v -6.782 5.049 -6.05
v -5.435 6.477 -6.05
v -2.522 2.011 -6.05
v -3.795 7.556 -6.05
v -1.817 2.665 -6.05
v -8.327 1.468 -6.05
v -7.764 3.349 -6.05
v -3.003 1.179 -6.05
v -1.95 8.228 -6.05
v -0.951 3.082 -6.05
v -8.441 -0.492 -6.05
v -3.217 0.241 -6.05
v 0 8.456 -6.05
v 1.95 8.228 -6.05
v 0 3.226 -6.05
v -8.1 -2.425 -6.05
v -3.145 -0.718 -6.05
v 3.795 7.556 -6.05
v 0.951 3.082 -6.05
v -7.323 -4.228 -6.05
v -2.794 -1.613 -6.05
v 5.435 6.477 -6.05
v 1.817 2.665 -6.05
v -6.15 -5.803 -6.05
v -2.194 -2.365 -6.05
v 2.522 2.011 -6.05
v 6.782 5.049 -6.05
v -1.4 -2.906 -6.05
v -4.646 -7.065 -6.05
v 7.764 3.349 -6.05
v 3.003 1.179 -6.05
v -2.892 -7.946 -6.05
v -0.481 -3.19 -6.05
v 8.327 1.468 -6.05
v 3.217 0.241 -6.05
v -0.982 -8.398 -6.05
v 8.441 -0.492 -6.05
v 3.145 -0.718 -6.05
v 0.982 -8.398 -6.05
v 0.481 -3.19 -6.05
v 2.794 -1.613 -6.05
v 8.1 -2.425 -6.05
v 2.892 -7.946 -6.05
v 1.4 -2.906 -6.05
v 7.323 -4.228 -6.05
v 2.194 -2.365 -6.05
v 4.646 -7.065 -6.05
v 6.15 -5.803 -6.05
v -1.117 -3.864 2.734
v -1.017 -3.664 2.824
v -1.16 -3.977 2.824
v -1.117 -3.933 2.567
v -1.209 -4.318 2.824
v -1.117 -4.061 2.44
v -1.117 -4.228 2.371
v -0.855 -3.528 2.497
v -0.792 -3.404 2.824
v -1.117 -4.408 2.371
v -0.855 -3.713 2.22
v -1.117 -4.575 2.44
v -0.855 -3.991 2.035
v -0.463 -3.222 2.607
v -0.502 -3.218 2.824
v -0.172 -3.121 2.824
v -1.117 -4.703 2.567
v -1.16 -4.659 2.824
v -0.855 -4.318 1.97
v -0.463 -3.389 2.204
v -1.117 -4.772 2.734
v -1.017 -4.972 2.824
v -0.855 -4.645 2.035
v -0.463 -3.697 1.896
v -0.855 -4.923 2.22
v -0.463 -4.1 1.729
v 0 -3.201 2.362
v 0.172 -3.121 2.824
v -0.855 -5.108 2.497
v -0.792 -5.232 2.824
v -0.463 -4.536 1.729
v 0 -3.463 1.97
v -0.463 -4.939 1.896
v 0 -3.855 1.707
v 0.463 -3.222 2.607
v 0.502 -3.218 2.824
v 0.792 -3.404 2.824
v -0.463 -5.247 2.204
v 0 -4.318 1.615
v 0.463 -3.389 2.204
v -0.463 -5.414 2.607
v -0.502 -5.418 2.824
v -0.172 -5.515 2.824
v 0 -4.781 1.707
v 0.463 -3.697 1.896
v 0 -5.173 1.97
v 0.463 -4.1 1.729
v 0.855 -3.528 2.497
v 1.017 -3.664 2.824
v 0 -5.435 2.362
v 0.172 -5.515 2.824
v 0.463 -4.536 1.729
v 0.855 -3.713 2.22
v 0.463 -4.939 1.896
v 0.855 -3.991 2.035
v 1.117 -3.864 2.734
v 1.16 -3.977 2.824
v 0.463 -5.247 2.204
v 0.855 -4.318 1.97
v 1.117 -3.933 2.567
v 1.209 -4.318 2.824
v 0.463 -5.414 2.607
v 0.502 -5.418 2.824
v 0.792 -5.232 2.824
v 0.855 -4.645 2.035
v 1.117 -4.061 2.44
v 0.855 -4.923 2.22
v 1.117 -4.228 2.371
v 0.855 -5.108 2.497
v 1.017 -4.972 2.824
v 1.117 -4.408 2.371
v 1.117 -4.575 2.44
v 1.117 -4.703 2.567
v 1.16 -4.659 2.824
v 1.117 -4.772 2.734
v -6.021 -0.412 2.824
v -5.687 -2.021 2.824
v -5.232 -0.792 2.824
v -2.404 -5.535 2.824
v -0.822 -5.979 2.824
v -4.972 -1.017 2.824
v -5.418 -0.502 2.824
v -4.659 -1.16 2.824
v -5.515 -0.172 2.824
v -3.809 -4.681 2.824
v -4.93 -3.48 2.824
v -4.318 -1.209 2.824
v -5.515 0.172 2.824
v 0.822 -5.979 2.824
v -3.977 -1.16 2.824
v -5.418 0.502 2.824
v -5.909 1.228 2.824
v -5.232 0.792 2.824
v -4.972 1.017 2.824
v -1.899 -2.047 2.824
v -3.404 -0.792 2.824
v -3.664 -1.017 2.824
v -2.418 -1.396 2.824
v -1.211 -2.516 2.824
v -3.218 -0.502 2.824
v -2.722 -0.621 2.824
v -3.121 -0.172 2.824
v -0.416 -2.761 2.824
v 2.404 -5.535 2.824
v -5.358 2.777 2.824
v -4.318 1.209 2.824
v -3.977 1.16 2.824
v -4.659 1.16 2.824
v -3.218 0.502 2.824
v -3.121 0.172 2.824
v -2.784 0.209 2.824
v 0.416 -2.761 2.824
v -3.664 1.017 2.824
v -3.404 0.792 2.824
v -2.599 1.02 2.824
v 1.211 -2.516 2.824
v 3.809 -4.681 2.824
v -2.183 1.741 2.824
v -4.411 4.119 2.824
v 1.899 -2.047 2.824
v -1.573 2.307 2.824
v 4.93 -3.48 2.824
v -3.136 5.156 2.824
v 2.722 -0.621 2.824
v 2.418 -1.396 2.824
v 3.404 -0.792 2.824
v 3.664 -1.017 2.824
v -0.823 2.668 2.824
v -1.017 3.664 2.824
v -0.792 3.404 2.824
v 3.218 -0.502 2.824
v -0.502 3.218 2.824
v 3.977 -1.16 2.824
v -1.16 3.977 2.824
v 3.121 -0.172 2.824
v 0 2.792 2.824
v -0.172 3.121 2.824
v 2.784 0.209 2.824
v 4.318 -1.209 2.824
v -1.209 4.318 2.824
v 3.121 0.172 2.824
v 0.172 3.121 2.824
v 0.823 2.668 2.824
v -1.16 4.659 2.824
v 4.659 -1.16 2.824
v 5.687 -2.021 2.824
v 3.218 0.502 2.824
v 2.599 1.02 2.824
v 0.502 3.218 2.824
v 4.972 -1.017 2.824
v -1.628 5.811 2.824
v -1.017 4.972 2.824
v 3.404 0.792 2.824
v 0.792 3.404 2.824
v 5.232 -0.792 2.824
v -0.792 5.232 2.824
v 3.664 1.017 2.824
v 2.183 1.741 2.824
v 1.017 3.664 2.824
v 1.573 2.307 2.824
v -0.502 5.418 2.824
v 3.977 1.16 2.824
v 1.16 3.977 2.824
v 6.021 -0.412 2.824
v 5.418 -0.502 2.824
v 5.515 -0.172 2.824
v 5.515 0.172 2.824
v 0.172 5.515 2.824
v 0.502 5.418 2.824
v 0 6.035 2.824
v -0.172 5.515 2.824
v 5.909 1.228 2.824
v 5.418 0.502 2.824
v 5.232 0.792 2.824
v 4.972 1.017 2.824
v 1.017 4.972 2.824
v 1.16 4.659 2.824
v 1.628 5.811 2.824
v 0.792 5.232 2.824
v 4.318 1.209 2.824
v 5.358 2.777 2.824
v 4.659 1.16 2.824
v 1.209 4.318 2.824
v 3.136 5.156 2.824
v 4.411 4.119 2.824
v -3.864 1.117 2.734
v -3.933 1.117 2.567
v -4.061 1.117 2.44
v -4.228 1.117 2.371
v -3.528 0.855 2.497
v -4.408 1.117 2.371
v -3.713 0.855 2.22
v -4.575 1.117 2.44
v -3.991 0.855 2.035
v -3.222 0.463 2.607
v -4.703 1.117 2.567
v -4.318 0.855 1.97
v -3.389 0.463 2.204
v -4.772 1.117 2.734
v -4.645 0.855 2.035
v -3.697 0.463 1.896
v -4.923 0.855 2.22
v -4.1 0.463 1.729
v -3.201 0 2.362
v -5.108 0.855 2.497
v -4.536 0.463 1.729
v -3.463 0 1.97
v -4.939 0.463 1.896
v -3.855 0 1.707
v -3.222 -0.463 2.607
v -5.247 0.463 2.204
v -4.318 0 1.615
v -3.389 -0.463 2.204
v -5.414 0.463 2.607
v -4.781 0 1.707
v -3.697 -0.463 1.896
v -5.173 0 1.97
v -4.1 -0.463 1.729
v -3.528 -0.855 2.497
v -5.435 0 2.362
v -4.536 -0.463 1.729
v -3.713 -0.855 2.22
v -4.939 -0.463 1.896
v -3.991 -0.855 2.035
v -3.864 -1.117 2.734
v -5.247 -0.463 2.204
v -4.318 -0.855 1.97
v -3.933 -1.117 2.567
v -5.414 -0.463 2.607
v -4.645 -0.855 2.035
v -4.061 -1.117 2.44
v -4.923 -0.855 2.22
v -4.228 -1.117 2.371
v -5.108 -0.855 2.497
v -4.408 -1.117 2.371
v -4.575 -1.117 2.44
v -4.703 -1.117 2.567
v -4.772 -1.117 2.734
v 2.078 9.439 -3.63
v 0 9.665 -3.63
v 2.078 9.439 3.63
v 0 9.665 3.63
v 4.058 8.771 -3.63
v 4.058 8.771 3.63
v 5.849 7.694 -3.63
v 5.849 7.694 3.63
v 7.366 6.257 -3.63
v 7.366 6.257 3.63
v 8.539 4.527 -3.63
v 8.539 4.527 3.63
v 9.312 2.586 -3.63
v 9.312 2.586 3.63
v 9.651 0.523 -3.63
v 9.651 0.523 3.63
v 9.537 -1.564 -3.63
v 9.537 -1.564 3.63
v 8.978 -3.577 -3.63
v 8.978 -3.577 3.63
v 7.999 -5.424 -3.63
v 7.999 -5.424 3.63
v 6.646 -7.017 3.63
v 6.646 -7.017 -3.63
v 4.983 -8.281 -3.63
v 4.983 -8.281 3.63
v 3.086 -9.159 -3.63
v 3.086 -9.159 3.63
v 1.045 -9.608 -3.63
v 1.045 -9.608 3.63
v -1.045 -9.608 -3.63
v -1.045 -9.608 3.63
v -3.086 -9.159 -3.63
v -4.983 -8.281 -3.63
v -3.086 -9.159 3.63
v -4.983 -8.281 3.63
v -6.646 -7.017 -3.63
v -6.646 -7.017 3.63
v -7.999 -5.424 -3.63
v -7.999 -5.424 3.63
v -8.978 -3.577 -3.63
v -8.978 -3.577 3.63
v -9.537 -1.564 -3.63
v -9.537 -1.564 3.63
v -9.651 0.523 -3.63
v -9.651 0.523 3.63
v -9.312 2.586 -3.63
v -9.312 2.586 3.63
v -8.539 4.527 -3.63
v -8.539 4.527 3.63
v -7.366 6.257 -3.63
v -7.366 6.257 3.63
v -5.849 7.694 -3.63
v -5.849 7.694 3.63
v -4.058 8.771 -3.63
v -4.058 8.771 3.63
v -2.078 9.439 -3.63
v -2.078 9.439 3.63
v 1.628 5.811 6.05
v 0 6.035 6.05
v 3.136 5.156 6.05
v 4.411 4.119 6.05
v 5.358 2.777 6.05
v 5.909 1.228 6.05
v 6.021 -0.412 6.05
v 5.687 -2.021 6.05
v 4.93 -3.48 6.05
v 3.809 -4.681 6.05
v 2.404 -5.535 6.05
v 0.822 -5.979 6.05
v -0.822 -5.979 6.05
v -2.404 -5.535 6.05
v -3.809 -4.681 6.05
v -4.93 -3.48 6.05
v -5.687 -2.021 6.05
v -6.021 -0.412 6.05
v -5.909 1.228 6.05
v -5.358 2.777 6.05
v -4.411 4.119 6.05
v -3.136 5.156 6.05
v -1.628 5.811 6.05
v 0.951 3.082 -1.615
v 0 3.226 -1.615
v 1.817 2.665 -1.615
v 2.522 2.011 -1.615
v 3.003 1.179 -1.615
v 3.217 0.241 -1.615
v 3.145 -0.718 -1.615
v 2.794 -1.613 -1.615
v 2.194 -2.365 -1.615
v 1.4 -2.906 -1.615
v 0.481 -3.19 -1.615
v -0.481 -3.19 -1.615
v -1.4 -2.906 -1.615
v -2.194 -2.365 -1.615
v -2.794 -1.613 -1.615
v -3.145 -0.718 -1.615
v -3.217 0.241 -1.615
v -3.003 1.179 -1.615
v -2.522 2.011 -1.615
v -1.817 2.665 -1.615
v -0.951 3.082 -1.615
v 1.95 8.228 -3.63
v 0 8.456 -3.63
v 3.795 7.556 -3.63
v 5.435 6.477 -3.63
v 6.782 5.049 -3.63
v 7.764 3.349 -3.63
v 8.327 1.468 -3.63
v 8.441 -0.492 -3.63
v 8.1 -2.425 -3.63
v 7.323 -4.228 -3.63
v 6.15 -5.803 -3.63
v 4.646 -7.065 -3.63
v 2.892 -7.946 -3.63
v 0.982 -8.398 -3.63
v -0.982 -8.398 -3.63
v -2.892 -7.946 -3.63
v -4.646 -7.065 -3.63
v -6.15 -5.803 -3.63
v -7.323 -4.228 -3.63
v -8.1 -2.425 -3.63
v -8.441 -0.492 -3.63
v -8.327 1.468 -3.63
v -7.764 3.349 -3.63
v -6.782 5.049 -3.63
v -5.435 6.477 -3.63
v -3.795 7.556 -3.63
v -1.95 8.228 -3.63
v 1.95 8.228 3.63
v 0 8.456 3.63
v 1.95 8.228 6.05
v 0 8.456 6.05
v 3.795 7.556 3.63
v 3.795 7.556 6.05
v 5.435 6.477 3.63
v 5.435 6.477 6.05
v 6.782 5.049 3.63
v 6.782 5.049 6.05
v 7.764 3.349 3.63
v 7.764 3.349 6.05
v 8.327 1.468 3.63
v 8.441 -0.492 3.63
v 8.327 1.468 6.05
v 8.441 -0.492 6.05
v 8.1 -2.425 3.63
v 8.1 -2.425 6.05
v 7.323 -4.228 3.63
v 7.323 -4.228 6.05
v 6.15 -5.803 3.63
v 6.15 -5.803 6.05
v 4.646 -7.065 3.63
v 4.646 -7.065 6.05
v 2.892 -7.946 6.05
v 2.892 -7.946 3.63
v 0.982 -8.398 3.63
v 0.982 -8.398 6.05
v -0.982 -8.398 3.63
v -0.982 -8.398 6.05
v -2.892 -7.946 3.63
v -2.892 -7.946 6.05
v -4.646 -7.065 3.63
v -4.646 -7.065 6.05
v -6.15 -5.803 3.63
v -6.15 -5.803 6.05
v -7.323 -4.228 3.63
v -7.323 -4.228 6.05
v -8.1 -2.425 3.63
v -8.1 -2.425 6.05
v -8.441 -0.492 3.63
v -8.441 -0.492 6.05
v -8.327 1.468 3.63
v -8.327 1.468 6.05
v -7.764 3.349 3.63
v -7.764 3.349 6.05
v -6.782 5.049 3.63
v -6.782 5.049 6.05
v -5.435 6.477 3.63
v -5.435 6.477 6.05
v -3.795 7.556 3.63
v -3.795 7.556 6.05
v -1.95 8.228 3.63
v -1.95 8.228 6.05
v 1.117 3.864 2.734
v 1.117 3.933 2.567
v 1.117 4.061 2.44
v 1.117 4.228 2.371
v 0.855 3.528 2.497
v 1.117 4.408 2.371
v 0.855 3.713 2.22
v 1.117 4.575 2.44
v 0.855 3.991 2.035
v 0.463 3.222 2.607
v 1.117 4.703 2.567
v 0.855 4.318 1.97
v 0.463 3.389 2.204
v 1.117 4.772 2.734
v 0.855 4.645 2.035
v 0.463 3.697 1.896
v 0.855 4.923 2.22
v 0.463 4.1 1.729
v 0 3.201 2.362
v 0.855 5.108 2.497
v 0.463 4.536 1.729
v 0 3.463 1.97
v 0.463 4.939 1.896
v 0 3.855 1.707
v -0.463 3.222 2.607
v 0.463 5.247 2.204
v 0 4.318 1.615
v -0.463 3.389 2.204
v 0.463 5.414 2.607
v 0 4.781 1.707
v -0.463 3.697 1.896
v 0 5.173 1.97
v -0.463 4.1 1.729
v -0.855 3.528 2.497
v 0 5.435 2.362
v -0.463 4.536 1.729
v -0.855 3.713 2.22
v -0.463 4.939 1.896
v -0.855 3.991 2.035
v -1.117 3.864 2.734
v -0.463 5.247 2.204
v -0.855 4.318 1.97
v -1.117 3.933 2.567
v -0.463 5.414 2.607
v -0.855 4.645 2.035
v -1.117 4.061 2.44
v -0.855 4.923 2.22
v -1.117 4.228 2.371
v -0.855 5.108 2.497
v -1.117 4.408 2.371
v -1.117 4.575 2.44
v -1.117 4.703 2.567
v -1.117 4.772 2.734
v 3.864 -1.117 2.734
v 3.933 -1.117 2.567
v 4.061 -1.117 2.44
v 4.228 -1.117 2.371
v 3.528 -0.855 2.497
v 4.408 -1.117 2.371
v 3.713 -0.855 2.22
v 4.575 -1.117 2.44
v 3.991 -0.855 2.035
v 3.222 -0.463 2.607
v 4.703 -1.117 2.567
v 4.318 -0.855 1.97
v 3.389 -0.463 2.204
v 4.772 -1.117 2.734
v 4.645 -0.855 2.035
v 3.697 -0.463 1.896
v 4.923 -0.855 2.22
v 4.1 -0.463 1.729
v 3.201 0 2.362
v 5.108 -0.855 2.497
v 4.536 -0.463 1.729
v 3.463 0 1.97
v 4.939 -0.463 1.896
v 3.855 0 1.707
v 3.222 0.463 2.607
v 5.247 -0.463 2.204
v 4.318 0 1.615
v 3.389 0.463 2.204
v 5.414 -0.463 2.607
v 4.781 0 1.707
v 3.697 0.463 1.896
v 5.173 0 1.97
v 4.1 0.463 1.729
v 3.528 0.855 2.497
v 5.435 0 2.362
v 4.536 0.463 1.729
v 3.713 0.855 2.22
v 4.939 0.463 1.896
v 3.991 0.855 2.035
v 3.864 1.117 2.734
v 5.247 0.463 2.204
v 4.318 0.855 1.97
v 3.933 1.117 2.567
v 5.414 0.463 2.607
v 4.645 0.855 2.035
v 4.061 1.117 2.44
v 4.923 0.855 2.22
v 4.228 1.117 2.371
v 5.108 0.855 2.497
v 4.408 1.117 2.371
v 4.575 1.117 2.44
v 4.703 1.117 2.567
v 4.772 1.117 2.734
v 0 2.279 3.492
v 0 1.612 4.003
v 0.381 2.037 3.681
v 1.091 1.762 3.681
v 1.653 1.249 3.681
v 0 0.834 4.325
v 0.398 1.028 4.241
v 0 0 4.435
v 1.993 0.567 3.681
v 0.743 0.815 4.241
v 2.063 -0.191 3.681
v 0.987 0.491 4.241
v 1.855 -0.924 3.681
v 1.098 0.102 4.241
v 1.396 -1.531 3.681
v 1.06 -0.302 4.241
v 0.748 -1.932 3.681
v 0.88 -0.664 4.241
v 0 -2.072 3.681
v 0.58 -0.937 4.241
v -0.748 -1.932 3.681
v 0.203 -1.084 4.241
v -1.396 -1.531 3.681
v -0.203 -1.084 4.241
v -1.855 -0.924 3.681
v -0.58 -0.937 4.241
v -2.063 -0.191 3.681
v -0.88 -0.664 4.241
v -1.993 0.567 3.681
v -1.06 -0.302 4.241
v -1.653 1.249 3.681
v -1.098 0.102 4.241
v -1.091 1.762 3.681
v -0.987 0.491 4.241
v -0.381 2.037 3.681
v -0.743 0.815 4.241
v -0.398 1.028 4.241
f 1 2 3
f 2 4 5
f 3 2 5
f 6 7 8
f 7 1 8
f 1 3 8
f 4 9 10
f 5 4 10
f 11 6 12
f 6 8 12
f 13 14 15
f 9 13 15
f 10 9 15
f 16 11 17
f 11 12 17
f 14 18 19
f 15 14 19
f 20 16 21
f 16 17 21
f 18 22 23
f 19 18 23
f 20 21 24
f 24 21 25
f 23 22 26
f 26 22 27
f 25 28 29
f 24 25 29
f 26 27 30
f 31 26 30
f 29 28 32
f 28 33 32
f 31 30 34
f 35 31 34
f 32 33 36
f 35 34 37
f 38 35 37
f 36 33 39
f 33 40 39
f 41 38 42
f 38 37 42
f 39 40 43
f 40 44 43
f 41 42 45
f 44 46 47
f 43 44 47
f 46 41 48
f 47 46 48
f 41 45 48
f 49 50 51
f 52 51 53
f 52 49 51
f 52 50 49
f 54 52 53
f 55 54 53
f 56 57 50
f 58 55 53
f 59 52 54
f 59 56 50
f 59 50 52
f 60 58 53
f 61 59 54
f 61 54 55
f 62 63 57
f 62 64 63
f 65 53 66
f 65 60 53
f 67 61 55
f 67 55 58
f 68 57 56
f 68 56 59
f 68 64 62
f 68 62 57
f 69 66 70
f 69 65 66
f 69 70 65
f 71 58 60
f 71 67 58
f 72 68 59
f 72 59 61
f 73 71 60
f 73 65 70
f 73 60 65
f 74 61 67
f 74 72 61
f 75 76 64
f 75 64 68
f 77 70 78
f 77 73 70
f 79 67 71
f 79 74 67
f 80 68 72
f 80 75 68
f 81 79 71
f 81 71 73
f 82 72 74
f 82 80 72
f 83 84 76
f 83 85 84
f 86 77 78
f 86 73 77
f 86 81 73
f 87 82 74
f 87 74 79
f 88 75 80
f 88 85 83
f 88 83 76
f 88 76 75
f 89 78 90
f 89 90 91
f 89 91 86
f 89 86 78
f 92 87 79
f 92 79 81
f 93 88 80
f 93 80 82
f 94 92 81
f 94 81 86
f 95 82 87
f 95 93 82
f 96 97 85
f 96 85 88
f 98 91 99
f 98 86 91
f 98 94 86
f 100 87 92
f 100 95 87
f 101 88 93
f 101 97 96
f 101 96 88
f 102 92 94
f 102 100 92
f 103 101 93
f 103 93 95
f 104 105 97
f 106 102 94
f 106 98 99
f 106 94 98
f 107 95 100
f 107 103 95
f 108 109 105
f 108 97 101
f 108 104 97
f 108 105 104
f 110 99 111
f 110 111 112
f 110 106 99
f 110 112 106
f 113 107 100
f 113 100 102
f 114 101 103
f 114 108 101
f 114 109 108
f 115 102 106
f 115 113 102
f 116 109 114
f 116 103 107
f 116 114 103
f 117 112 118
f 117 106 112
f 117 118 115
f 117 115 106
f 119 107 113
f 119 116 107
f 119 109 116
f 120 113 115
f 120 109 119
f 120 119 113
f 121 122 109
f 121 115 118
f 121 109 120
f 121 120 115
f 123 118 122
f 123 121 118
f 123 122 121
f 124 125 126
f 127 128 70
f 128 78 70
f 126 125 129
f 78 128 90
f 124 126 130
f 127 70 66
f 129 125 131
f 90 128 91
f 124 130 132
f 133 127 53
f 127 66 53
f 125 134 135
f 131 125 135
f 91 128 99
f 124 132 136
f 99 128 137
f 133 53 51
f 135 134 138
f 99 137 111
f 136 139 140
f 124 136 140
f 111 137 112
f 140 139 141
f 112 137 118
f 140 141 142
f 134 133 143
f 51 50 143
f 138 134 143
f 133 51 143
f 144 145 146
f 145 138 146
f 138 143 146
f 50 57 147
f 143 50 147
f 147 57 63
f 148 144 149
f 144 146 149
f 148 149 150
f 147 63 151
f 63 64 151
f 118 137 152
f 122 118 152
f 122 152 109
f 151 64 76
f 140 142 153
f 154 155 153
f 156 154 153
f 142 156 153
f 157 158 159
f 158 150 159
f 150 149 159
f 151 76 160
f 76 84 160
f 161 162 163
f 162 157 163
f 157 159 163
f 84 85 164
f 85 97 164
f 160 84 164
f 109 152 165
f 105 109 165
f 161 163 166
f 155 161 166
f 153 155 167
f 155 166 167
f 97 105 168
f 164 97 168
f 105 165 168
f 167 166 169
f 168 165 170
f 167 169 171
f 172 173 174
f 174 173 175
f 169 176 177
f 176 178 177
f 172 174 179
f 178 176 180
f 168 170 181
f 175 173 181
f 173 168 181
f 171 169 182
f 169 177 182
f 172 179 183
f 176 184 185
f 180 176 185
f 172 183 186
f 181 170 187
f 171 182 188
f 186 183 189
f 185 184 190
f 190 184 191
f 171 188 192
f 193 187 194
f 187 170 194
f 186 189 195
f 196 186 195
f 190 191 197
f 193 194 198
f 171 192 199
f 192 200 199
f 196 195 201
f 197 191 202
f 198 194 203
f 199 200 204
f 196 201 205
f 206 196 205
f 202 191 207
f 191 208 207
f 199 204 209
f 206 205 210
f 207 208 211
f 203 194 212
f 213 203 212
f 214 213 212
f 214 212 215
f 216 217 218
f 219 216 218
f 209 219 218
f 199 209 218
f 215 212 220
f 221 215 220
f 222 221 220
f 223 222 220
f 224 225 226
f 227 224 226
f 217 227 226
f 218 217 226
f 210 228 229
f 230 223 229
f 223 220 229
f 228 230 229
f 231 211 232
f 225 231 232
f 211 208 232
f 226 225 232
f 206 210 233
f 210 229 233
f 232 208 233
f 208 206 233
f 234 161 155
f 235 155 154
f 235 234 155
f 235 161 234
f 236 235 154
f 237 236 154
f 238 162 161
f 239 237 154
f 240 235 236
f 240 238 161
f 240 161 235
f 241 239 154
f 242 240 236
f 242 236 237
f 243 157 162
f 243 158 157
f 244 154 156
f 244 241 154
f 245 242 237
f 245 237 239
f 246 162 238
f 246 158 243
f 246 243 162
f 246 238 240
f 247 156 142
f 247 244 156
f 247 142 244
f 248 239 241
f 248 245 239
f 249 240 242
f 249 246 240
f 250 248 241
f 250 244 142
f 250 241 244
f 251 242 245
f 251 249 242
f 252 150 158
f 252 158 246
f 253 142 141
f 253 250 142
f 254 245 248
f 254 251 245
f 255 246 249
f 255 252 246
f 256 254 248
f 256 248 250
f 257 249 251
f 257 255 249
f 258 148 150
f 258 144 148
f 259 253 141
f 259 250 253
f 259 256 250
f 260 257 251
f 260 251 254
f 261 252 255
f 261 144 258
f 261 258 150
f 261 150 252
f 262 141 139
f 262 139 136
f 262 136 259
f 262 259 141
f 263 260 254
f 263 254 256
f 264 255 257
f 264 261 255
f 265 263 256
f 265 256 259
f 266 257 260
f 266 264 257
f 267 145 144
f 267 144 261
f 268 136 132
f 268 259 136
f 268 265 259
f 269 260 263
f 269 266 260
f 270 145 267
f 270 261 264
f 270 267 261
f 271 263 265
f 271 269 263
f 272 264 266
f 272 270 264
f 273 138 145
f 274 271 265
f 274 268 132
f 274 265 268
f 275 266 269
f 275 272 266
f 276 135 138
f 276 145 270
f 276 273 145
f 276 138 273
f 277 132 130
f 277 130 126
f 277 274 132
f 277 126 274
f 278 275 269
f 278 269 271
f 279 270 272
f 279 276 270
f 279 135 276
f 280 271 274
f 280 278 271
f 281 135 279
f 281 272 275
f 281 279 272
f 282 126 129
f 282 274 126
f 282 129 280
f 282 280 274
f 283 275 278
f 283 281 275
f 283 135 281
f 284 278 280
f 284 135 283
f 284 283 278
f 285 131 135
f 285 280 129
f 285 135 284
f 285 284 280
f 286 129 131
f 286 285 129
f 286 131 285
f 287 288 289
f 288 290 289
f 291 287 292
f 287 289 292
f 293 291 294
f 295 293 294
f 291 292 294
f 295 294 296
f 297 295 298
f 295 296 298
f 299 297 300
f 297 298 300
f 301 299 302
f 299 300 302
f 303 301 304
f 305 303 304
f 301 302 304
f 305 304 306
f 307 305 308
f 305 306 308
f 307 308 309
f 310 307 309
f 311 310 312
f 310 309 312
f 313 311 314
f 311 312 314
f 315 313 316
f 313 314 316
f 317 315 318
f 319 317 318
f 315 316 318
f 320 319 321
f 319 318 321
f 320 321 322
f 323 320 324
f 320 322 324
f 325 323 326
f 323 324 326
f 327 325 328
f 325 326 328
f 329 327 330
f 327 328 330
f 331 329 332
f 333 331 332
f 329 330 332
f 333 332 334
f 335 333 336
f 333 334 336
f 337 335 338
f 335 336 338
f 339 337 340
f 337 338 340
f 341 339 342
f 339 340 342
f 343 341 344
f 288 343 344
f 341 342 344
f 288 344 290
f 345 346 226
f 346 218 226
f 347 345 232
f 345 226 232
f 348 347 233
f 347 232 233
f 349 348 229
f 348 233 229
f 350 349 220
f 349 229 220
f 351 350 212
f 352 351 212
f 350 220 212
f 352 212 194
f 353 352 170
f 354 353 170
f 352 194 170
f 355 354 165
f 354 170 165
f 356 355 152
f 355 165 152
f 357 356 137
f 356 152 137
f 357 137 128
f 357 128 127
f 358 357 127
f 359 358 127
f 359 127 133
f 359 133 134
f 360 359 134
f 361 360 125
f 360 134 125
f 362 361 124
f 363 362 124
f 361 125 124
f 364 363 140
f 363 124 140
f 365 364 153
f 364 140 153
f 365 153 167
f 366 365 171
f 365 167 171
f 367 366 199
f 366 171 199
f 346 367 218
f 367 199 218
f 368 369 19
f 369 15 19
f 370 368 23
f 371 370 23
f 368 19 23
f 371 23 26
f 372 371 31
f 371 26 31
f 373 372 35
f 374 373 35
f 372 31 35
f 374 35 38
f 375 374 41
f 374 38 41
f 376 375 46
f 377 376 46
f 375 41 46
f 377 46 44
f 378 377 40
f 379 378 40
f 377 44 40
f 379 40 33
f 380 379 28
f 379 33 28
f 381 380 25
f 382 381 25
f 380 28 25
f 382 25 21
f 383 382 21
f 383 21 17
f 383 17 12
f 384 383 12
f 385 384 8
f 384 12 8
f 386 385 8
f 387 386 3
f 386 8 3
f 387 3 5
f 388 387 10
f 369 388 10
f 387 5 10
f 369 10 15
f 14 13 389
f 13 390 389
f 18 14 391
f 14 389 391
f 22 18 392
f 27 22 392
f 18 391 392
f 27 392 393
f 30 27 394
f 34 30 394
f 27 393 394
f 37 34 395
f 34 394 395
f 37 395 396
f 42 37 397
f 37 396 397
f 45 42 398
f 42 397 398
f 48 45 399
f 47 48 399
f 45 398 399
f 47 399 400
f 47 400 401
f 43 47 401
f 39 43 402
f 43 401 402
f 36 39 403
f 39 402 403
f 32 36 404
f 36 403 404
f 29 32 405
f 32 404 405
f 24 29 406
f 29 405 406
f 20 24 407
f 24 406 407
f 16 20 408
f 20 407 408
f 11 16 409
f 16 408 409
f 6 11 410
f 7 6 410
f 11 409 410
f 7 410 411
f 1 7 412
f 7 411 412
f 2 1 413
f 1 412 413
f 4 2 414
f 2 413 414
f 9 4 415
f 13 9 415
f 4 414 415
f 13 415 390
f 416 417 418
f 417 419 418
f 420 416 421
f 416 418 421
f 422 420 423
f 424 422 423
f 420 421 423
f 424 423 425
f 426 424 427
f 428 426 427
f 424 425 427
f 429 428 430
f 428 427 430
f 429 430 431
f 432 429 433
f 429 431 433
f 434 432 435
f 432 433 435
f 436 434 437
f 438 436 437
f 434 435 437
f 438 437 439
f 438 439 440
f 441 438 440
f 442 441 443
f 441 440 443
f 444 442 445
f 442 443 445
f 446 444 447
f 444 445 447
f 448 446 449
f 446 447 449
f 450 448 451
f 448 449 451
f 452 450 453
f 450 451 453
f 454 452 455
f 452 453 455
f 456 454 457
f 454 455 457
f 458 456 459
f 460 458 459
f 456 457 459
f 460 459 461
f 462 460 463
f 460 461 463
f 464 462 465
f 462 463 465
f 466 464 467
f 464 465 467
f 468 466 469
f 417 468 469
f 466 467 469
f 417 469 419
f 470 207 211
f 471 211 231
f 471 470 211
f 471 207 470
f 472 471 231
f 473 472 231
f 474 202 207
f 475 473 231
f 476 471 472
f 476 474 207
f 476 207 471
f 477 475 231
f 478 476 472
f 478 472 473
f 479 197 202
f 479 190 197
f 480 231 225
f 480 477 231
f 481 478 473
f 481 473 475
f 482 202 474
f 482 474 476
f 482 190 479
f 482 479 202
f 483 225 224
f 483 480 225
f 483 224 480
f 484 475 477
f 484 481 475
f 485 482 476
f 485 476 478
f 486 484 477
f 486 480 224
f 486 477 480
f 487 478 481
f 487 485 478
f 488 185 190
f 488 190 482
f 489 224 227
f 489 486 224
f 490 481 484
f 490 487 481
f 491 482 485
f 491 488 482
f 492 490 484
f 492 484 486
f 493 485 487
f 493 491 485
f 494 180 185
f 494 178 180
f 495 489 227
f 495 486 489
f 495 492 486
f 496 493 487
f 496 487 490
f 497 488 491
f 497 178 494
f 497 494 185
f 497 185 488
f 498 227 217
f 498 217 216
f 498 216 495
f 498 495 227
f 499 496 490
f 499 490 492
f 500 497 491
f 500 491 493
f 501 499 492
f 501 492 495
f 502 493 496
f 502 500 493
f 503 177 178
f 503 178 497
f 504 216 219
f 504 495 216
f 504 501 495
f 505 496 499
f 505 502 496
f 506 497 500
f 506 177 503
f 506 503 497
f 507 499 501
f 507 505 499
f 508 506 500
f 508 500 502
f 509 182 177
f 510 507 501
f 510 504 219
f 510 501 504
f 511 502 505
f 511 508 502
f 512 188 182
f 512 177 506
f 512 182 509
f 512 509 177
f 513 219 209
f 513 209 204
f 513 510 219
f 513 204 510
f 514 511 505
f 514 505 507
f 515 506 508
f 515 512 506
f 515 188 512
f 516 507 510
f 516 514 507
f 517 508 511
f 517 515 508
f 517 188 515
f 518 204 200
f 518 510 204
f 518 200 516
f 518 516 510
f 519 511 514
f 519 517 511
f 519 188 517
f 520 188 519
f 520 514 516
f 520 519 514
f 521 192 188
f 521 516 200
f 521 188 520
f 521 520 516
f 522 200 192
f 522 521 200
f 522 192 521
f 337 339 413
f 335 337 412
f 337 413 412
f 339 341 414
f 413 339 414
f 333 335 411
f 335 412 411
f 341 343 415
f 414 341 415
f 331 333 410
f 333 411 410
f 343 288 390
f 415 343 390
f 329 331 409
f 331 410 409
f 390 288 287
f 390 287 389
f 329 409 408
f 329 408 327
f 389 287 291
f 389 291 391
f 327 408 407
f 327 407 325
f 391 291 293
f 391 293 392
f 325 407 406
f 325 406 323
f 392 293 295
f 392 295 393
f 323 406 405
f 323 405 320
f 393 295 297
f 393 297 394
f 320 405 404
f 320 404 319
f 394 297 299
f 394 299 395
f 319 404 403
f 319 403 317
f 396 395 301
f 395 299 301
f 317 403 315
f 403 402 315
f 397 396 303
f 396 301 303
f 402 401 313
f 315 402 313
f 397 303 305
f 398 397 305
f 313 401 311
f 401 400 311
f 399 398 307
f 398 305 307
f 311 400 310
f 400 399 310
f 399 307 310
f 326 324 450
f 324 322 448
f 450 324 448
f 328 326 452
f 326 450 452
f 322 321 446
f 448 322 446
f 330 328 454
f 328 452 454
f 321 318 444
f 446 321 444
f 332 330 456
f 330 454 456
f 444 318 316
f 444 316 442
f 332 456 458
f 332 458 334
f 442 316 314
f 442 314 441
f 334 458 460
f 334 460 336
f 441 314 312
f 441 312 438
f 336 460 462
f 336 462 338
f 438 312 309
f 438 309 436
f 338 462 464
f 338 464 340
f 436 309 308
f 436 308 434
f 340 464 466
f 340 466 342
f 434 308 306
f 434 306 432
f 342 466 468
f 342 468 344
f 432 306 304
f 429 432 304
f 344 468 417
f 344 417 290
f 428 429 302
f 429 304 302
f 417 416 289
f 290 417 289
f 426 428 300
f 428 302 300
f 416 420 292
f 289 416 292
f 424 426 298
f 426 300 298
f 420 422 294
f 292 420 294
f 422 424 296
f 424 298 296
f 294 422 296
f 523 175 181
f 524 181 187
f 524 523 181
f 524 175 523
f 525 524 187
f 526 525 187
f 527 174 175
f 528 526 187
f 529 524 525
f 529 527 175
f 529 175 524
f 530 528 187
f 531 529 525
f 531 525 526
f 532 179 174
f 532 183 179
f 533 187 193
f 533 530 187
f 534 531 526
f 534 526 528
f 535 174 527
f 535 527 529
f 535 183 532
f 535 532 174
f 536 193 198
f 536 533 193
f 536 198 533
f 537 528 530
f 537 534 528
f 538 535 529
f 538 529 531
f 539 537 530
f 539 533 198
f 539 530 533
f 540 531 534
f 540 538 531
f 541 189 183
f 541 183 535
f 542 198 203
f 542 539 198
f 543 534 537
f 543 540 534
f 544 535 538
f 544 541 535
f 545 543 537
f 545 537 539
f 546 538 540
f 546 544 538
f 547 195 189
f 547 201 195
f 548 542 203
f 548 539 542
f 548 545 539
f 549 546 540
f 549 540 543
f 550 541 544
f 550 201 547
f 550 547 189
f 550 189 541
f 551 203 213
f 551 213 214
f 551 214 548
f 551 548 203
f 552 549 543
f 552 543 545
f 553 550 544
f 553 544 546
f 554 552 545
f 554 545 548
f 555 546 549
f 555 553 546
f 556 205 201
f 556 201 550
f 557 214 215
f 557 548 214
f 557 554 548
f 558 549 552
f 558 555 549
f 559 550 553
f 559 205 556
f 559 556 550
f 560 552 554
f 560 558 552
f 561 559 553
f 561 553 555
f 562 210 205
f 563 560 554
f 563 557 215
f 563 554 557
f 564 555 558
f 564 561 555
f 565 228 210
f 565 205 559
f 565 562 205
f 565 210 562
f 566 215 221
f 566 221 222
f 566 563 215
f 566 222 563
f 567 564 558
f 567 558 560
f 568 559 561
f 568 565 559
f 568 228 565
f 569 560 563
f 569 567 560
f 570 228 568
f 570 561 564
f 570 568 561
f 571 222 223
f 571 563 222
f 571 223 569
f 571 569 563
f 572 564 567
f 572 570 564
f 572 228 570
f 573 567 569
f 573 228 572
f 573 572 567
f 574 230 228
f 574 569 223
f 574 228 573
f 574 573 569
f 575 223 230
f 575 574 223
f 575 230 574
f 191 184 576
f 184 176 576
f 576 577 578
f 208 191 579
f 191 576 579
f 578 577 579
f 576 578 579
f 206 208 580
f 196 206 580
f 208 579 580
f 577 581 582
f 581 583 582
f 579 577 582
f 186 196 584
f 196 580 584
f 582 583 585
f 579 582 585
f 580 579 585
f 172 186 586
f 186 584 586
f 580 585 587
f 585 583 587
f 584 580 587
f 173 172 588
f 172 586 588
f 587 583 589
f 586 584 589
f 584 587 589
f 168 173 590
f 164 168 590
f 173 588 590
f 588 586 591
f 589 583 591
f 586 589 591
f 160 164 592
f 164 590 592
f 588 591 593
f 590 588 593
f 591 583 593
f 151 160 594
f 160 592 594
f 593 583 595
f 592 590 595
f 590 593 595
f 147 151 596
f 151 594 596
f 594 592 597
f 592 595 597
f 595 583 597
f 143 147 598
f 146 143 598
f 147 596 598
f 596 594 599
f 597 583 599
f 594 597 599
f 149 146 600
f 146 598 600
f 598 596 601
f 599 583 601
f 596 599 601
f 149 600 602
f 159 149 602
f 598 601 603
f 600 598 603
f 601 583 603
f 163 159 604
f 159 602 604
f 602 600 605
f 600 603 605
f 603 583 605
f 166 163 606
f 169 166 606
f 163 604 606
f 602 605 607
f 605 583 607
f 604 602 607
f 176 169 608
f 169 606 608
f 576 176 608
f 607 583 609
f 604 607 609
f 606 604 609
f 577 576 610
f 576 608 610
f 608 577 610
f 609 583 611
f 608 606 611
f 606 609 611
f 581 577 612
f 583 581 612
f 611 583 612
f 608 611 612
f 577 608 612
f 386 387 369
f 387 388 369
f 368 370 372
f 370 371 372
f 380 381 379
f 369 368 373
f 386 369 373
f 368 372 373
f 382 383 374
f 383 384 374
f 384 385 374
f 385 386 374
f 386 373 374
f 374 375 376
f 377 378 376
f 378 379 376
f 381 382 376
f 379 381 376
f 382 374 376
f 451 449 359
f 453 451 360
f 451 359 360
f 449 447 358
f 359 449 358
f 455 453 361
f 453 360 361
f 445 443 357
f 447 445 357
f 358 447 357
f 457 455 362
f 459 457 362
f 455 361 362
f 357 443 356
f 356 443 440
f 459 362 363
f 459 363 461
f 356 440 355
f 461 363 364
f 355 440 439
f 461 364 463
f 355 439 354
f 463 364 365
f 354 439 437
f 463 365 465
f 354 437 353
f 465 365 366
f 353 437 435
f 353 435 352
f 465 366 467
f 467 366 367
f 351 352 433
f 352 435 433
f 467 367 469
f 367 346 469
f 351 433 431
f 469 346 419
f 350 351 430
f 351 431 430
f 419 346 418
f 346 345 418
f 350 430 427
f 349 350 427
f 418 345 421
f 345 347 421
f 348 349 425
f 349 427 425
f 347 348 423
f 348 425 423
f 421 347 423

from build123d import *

# Parameters (mm, degrees)
CIRPATTERN1_COUNT = 4


with BuildPart() as part:
    # Sketch1 → Revolve1 (revolve)
    with BuildSketch(Plane(origin=(0, 0, 0), x_dir=(0, 0, -1), z_dir=(1, 0, 0))):
        with BuildLine():
            Line((-4.43484, 0), (1.61544, 0))
            Line((1.61544, 0), (1.61544, 3.2258))
            Line((1.61544, 3.2258), (6.05028, 3.2258))
            Line((6.05028, 3.2258), (6.05028, 8.45566))
            Line((6.05028, 8.45566), (3.62966, 8.45566))
            Line((3.62966, 8.45566), (3.62966, 9.6647))
            Line((3.62966, 9.6647), (-3.62966, 9.6647))
            Line((-3.62966, 9.6647), (-3.62966, 8.45566))
            Line((-3.62966, 8.45566), (-6.05028, 8.45566))
            Line((-6.05028, 8.45566), (-6.05028, 6.03504))
            Line((-6.05028, 6.03504), (-2.82448, 6.03504))
            Line((-2.82448, 6.03504), (-2.82448, 2.792156737))
            ThreePointArc((-2.82448, 2.792156737), (-4.003397886, 1.6116295), (-4.43484, 0))
        make_face()
    revolve(axis=Axis((0, 0, 4.43484), (0, 0, -1)))

    # Sketch2 → Cut-Revolve1 (revolve, cut)
    with BuildSketch(Plane.XY.offset(2.82448)):
        with BuildLine():
            Line((-1.20904, 4.318), (1.20904, 4.318))
            ThreePointArc((1.20904, 4.318), (0, 5.52704), (-1.20904, 4.318))
        make_face()
    cut_revolve1 = revolve(axis=Axis((-1.20904, 4.318, 2.82448), (1, 0, 0)), mode=Mode.SUBTRACT)

    # CirPattern1: Cut-Revolve1 ×4 about axis
    cirpattern1_axis = Axis((0, 0, 0), (0, 0, 1))
    for i in range(1, CIRPATTERN1_COUNT):
        add(cut_revolve1.rotate(cirpattern1_axis, i * 360 / CIRPATTERN1_COUNT), mode=Mode.SUBTRACT)


solid = part.part
